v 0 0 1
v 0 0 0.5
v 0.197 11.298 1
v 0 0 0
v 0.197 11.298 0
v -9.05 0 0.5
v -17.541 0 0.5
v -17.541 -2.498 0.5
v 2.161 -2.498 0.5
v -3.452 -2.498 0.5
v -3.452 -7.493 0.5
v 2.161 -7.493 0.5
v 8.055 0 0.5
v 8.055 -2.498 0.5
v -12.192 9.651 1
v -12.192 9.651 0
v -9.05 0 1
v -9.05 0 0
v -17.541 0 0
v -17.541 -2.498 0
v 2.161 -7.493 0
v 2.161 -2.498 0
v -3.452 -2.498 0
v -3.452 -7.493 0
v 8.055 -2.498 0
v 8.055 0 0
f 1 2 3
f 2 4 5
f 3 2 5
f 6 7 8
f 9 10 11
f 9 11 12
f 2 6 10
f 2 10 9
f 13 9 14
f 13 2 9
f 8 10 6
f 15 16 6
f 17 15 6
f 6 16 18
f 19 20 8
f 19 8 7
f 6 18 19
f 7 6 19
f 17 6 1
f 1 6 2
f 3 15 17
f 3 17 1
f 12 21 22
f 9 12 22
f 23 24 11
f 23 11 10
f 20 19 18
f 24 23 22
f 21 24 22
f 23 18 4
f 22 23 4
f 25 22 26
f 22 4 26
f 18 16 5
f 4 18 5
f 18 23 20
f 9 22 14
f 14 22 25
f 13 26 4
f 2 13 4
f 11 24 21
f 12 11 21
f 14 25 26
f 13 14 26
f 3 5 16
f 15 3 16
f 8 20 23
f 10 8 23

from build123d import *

# Parameters (mm, degrees)
F1_DEPTH = 1
F2_W     = 5.6130217854
F2_H     = 2.4976935238
F2_W_2   = 14.08868609
F2_W_3   = 5.8936730493
F2_H_2   = 4.9955896102
F3_DEPTH = 0.5


with BuildPart() as f1:
    # F0 (on Top) → F1 (new body)
    with BuildSketch(Plane.XY):
        Polygon((-12.1924033149, 9.6513108647), (-9.05, 0), (-5.4919267763, 4.3473211306), align=None)
        Polygon((-5.4919267763, 4.3473211306), (0, 0), (0.1970994475, 11.2982809227), align=None)
        Polygon((-12.1924033149, 9.6513108647), (-5.4919267763, 4.3473211306), (0.1970994475, 11.2982809227), align=None)
        Polygon((-9.05, 0), (0, 0), (-5.4919267763, 4.3473211306), align=None)
    extrude(amount=F1_DEPTH)

    # F2 (on Top) → F3 (join)
    with BuildSketch(Plane.XY):
        with Locations((-0.6455987459, -1.2488467619)):
            Rectangle(F2_W, F2_H)
        with Locations((-10.4964526836, -1.2488467619)):
            Rectangle(F2_W_2, F2_H)
        with Locations((5.1077486714, -1.2488467619)):
            Rectangle(F2_W_3, F2_H)
        with Locations((-0.6455987459, -4.9954883289)):
            Rectangle(F2_W, F2_H_2)
    extrude(amount=F3_DEPTH)


solid = f1.part
